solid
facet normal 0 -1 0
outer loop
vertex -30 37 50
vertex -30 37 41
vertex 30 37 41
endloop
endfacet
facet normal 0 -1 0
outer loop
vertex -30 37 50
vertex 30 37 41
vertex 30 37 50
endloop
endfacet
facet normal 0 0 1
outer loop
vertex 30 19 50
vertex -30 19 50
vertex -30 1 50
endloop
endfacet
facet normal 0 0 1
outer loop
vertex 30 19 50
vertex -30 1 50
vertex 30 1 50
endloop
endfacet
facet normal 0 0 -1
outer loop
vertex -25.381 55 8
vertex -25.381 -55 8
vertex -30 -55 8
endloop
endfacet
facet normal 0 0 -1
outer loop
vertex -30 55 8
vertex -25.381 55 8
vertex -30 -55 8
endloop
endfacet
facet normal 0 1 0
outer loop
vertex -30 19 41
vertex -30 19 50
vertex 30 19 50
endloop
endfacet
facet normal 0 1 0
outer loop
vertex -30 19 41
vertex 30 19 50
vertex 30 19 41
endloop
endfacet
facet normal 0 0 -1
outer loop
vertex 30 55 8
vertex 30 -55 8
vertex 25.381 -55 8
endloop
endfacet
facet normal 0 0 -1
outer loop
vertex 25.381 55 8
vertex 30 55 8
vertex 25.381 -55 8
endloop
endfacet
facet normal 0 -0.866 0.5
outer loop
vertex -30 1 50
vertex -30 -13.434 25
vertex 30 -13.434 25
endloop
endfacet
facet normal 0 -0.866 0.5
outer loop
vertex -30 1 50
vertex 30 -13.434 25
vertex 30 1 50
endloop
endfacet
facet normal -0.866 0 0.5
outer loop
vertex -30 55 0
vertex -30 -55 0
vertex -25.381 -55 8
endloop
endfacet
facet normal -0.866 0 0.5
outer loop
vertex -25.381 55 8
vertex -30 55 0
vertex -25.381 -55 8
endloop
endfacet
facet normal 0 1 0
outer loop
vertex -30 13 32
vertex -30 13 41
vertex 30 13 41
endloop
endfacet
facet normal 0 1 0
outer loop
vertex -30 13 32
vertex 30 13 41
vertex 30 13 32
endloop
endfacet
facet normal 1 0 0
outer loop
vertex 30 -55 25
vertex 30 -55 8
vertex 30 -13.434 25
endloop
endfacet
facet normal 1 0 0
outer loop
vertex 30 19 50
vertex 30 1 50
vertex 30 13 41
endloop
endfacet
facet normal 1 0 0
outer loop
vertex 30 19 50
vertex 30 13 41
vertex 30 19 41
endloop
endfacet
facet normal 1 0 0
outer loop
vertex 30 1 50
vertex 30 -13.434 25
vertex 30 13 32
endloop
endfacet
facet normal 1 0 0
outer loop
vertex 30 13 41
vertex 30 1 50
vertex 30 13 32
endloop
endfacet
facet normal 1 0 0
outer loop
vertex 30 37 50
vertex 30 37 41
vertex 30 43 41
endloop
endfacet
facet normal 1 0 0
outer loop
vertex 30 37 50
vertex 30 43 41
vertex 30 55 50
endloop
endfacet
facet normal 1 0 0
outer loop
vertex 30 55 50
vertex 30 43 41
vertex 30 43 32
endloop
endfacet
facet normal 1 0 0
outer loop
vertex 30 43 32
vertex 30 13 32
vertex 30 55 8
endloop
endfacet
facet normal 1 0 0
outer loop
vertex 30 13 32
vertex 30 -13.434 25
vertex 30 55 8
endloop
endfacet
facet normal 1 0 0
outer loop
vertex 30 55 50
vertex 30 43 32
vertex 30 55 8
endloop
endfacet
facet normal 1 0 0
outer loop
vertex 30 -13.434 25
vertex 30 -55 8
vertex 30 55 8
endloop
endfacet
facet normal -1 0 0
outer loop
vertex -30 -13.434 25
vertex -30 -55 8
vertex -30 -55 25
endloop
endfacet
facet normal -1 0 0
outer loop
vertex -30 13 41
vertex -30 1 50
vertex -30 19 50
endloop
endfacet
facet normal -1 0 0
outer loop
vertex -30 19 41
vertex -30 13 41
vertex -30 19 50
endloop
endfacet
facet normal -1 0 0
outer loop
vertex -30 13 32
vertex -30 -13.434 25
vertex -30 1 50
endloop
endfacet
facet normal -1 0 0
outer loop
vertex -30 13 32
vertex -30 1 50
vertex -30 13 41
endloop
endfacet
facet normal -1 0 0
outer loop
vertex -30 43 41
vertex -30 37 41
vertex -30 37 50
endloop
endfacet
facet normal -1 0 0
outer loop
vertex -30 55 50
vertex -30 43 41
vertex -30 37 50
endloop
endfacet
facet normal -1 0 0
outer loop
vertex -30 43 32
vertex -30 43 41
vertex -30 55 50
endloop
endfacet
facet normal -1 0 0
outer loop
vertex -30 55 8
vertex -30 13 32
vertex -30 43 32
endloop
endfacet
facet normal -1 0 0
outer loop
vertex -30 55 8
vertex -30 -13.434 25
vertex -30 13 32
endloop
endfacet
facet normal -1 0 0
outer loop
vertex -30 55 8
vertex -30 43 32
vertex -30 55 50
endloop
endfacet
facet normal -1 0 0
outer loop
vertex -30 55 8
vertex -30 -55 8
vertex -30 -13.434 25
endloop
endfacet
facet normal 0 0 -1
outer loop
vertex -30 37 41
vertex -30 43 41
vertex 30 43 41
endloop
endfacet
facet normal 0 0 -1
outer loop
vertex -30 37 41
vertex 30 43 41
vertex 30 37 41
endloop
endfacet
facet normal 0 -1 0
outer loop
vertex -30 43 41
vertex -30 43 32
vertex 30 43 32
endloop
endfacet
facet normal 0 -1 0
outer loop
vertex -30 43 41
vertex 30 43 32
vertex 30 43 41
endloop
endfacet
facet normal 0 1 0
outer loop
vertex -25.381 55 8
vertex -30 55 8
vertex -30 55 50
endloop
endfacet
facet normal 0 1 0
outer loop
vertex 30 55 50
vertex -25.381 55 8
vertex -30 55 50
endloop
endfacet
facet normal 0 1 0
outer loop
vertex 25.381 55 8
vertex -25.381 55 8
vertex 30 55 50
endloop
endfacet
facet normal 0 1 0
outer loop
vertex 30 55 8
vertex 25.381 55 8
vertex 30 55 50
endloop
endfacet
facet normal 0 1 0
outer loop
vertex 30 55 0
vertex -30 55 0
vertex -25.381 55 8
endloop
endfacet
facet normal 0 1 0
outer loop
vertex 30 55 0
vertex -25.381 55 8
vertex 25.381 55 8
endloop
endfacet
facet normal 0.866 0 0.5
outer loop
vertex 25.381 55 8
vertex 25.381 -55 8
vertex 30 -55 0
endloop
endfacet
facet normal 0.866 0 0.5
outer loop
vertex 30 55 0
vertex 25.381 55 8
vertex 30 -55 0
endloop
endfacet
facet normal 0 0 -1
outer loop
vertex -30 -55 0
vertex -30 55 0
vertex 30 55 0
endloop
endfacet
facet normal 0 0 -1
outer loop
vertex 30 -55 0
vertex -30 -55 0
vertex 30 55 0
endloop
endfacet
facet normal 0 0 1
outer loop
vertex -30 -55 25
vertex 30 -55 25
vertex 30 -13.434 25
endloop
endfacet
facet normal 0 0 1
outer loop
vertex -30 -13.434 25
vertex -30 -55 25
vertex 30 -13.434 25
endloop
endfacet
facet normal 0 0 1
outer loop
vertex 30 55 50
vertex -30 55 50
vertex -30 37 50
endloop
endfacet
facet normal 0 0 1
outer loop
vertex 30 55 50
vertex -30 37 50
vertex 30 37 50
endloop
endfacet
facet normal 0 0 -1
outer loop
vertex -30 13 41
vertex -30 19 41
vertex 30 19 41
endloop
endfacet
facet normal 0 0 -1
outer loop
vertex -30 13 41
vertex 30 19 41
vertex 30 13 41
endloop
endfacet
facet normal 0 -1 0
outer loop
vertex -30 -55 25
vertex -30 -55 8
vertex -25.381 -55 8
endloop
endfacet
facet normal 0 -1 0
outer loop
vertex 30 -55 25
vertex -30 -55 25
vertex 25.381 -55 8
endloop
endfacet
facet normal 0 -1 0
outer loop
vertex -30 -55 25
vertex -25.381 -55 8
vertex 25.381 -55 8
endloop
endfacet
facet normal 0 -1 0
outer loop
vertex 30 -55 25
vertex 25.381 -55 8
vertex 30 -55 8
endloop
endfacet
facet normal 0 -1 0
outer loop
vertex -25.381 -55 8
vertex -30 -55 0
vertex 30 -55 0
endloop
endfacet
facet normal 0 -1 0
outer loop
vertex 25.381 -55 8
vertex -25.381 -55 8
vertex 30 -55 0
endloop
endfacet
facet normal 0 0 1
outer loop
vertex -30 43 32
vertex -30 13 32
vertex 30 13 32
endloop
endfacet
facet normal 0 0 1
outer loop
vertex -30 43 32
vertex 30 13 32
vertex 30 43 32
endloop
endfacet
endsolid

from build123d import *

# Parameters (mm, degrees)
F0_W     = 60
F0_H     = 110
F1_DEPTH = 50
F3_DEPTH = 60.001
F5_DEPTH = 110.001


with BuildPart() as f1:
    # F0 (on Top) → F1 (new body)
    with BuildSketch(Plane.XY):
        Rectangle(F0_W, F0_H)
    extrude(amount=F1_DEPTH)

    # F2 (on face) → F3 (cut, through all)
    with BuildSketch(Plane.YZ.offset(30)):
        Polygon((-55, 50), (-55, 25), (-13.433757, 25), (1, 50), align=None)
        Polygon((37, 50), (19, 50), (19, 41), (13, 41), (13, 32), (43, 32), (43, 41), (37, 41), align=None)
    extrude(amount=-F3_DEPTH, mode=Mode.SUBTRACT)

    # F4 (on face) → F5 (cut, through all)
    with BuildSketch(Plane.XZ.offset(55)):
        Polygon((25.381198, 8), (30, 0), (30, 8), align=None)
        Polygon((-25.381198, 8), (-30, 8), (-30, 0), align=None)
    extrude(amount=-F5_DEPTH, mode=Mode.SUBTRACT)


solid = f1.part
